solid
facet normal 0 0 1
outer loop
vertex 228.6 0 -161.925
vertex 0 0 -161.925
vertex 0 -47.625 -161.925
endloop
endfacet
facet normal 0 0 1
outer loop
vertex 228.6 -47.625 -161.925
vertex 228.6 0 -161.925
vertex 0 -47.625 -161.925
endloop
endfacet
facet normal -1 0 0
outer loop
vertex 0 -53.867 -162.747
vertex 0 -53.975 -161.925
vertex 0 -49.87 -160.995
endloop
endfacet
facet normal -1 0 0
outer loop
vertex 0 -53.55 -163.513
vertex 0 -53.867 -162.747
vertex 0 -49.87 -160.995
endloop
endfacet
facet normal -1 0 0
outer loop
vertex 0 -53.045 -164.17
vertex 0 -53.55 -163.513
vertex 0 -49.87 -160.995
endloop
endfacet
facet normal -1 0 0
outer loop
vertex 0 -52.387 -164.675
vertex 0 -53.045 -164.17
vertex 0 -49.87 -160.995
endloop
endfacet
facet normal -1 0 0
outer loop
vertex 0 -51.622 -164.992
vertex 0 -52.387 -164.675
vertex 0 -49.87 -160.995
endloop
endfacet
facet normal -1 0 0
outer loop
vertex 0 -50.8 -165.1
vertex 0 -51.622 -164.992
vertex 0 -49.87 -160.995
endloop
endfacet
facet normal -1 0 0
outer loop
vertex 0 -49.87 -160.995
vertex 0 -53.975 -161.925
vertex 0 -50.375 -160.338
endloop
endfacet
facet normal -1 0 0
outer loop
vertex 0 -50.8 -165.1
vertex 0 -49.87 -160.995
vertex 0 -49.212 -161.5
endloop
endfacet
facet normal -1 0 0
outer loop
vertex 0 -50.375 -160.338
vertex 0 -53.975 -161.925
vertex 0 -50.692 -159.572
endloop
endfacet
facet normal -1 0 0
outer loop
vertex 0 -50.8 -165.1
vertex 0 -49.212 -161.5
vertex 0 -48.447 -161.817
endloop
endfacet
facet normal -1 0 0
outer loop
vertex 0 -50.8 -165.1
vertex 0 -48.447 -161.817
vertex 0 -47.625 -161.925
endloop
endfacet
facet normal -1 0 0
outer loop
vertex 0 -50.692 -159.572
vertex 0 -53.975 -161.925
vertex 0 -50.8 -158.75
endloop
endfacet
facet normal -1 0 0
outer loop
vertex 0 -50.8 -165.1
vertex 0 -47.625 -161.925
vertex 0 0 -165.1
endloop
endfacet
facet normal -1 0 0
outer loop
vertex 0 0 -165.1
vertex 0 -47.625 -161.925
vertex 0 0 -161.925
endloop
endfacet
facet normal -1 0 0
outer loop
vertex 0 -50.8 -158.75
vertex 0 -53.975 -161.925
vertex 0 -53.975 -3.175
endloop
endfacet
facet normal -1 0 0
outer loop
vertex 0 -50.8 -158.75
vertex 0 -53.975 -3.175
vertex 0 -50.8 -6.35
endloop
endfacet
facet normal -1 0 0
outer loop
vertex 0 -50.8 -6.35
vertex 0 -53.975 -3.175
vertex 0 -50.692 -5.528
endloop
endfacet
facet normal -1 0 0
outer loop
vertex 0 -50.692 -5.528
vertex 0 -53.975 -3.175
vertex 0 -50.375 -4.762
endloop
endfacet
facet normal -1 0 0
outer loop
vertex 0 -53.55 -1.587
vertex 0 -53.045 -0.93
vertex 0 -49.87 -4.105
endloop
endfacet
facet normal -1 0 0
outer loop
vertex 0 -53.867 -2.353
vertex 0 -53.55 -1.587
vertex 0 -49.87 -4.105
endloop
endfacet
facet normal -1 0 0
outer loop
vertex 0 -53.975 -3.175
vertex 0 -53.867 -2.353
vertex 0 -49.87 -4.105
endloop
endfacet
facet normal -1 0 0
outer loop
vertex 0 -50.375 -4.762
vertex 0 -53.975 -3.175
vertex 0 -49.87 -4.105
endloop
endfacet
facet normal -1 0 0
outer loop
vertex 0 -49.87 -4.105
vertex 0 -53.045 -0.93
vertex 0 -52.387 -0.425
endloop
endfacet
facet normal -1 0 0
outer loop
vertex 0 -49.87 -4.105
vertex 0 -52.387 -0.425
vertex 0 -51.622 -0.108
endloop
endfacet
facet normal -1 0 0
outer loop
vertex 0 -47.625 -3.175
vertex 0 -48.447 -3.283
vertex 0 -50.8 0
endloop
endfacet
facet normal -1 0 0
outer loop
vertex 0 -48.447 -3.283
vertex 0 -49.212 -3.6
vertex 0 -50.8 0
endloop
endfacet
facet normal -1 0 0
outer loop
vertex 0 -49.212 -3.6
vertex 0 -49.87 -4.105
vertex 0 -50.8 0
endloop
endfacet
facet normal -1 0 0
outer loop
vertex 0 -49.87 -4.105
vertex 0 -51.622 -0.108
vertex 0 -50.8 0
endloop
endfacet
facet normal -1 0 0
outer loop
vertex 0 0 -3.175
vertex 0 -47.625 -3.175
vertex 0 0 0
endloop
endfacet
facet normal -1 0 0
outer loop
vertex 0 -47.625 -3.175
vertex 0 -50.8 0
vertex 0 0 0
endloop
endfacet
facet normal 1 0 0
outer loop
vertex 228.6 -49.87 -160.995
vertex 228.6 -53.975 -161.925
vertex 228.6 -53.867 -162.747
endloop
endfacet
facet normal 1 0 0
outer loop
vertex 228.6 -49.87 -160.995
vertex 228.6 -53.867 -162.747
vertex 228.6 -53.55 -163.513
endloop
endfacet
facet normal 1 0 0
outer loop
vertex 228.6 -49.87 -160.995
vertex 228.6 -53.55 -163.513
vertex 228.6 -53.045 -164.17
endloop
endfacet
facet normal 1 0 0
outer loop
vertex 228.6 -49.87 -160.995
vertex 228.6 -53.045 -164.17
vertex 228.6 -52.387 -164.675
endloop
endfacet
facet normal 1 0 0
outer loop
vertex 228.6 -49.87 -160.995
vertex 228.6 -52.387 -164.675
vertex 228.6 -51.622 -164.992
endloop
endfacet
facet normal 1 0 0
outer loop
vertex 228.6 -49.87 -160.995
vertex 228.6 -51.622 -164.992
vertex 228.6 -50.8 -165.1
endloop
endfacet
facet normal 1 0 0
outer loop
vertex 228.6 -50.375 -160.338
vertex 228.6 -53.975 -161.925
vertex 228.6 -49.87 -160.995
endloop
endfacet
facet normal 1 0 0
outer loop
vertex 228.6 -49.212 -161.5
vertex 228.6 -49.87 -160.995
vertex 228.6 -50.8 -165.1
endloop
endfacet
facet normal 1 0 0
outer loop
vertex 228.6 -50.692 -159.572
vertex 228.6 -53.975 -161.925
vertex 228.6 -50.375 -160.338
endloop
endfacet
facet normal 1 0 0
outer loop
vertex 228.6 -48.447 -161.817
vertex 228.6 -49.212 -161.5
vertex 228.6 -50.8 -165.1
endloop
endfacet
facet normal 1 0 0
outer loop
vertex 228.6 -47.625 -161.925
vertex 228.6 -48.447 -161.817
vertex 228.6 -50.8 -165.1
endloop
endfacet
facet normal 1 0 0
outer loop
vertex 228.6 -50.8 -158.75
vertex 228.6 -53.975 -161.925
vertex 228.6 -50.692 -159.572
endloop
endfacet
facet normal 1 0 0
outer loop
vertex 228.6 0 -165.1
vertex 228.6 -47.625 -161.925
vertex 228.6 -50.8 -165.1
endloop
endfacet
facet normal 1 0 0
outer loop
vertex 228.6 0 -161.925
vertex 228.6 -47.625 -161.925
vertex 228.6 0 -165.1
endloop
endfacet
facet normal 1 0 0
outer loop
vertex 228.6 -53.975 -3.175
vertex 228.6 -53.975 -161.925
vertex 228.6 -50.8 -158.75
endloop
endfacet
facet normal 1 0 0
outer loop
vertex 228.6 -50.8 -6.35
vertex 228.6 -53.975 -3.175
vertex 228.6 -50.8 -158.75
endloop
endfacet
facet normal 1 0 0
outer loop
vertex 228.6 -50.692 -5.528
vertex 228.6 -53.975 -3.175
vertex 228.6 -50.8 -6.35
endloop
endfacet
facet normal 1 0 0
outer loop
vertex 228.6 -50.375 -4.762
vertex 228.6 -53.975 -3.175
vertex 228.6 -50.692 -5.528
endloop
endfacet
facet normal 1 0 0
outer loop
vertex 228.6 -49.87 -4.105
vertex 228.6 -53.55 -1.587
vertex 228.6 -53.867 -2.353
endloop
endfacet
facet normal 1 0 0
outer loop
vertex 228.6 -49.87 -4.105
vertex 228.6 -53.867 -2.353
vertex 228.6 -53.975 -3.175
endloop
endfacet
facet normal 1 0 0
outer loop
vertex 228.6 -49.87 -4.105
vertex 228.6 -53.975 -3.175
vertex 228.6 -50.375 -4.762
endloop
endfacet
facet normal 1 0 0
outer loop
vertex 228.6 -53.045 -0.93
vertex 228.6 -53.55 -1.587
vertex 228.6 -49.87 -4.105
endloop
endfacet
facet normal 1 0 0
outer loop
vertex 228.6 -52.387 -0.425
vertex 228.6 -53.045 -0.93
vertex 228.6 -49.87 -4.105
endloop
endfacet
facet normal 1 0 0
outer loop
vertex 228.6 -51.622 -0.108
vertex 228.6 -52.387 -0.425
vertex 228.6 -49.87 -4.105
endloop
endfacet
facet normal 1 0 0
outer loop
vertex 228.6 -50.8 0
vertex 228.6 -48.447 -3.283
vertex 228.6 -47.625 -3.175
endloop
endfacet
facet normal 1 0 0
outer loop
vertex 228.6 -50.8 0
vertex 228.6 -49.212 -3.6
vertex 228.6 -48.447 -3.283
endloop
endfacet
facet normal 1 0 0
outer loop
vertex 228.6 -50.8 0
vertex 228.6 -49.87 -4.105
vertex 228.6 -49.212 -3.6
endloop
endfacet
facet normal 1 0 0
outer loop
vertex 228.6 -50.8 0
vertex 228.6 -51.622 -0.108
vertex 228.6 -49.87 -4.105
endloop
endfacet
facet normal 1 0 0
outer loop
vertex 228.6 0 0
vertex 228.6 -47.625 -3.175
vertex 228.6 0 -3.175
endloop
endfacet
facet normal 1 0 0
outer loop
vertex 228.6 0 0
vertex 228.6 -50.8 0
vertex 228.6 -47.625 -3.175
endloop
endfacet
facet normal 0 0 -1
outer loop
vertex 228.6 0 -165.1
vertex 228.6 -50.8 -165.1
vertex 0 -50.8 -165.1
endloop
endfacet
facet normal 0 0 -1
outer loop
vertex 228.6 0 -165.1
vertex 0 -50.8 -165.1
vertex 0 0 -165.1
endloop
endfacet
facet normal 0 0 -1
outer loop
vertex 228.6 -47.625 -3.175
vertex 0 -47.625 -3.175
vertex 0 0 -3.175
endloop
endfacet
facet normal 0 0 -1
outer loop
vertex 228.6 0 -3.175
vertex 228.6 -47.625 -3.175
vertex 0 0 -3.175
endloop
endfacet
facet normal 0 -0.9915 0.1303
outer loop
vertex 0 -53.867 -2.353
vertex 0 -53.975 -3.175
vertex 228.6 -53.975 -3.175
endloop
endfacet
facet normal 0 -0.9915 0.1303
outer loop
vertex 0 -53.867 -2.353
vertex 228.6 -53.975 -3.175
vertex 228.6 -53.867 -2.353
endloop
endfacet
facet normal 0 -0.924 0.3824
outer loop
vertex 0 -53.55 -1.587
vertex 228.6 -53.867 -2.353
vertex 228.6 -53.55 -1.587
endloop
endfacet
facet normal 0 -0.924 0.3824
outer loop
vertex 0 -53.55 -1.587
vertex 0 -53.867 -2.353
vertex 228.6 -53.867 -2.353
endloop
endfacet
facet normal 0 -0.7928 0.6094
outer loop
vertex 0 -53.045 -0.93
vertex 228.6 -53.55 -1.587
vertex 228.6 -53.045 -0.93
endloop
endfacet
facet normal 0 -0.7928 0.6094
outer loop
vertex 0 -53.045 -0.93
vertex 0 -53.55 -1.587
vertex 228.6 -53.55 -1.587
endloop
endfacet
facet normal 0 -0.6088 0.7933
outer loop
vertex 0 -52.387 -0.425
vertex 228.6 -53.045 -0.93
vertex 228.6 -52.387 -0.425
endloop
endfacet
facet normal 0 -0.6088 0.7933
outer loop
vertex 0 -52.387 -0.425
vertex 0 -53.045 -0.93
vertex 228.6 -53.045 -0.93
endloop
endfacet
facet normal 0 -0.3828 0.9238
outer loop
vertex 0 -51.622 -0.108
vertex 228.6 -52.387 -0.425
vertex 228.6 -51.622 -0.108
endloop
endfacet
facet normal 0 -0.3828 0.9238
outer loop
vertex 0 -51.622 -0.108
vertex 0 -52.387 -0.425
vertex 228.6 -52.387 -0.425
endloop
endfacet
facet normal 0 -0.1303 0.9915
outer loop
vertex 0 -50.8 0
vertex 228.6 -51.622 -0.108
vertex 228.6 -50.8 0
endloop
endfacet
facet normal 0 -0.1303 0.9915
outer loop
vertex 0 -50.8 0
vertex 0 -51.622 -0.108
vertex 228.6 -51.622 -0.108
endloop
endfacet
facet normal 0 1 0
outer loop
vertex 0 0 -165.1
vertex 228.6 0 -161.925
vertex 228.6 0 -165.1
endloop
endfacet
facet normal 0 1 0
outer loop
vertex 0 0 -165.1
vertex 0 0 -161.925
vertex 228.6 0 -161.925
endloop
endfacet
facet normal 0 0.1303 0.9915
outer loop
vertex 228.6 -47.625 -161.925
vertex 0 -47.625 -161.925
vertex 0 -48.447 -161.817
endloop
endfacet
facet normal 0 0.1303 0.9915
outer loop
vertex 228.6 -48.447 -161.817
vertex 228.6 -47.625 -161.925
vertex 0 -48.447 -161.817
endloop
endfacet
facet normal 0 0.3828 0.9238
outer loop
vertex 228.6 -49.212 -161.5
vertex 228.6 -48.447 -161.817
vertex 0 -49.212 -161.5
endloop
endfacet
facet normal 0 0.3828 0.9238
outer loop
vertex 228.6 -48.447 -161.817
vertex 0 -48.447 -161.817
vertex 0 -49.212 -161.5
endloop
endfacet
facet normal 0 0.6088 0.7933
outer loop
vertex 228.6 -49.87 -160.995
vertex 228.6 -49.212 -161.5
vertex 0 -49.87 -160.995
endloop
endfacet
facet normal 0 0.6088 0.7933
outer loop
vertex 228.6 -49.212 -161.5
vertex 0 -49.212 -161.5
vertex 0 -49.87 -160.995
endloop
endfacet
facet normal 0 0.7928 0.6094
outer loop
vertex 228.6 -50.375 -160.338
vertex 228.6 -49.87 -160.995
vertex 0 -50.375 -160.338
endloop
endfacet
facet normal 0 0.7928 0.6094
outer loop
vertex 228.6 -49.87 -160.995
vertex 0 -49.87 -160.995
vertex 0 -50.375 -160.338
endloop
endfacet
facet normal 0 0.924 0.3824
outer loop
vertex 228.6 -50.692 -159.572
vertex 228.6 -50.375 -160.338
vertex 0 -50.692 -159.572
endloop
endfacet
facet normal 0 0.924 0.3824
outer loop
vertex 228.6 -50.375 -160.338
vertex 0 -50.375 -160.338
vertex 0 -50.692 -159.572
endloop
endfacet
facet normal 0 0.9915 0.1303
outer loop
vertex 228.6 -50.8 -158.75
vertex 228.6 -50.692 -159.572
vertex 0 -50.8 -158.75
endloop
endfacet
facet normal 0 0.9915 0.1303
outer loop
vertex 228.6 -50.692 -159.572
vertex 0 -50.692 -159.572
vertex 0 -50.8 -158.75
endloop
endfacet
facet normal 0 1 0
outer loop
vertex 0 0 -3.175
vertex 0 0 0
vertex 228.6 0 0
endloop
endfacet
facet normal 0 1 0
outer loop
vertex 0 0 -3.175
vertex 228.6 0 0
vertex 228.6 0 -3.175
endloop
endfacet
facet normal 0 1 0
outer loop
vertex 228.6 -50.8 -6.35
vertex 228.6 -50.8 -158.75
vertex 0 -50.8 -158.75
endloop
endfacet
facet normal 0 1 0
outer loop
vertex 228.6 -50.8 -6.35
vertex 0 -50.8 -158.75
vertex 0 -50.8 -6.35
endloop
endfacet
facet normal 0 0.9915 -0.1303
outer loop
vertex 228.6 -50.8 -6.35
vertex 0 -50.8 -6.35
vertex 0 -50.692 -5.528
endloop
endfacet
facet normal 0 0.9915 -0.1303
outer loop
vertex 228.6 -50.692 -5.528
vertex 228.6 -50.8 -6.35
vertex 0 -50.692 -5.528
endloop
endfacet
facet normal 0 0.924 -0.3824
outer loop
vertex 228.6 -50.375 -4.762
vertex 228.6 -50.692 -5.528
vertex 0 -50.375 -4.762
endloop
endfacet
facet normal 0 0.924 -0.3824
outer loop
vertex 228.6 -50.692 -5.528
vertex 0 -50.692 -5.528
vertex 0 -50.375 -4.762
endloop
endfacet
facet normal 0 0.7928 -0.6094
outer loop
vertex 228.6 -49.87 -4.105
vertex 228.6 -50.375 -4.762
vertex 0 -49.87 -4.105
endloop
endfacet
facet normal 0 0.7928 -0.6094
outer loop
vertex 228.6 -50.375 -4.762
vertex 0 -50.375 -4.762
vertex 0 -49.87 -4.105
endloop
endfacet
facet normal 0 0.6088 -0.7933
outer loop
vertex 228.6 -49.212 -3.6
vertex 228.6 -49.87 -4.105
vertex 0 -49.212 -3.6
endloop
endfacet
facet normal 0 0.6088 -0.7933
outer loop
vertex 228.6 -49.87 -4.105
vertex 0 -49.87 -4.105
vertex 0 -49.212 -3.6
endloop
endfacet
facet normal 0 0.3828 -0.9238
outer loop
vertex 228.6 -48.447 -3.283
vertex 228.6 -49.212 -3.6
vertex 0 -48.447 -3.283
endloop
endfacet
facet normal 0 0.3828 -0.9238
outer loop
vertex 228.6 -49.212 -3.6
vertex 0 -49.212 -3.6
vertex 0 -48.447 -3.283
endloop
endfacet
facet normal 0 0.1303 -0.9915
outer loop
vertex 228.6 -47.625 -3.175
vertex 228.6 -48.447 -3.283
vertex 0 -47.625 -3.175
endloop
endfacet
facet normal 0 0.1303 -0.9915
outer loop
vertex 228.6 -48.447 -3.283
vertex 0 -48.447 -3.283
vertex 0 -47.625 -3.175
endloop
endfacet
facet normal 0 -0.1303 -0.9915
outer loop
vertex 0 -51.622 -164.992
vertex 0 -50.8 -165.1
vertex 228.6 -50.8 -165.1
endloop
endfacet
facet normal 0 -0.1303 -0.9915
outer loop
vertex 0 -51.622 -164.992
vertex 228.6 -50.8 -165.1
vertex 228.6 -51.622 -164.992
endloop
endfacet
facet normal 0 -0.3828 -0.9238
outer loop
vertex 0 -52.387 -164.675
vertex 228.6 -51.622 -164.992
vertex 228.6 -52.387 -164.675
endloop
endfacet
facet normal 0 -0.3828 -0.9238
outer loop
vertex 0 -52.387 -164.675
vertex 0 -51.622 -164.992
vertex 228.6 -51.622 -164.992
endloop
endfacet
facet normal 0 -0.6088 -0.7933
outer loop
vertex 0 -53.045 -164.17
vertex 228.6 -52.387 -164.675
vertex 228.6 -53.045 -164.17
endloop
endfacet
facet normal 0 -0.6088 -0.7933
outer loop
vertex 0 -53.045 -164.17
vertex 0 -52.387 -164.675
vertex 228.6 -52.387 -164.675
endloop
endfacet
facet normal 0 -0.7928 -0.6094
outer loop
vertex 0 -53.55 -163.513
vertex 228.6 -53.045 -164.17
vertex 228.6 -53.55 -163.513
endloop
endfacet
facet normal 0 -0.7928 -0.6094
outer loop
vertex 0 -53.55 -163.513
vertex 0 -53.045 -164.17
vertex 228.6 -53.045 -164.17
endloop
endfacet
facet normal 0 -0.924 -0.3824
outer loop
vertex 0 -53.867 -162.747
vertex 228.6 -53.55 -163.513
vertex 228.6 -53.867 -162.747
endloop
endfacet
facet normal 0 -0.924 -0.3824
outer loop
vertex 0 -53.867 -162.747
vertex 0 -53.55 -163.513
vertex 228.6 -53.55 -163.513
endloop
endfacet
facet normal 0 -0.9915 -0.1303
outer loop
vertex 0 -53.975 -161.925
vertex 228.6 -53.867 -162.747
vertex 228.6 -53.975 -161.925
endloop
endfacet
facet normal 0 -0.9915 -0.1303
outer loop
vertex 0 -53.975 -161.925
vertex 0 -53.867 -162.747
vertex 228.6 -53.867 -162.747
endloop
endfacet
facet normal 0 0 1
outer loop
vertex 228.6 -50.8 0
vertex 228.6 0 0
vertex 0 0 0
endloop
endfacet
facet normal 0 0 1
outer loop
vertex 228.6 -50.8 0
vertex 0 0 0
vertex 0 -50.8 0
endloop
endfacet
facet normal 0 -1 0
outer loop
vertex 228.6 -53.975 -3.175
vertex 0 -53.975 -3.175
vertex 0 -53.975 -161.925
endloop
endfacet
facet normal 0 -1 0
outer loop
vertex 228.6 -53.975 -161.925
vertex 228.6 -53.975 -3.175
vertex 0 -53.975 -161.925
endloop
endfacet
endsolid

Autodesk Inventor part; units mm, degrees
ref_plane "YZ Plane" through (0, 0, 0) normal (1, 0, 0) x (0, 1, 0)
ref_plane "XZ Plane" through (0, 0, 0) normal (0, 1, 0) x (-1, 0, 0)
ref_plane "XY Plane" through (0, 0, 0) normal (0, 0, 1) x (1, 0, 0)
sketch "Sketch1" plane through (0, 0, 0) normal (1, 0, 0) x (0, 1, 0)
  line L0 (0, 0) -> (-50.8, 0)
  line L1 (-53.975, -3.175) -> (-53.975, -161.925)
  line L2 (-50.8, -165.1) -> (0, -165.1)
  line L3 (0, -161.925) -> (-47.625, -161.925)
  line L4 (-50.8, -158.75) -> (-50.8, -6.35)
  line L5 (-47.625, -3.175) -> (0, -3.175)
  line L6 (0, 0) -> (0, -3.175)
  line L7 (0, -161.925) -> (0, -165.1)
  arc A0 (-50.8, 0) -> (-53.975, -3.175) centre (-50.8, -3.175) ccw
  arc A1 (-53.975, -161.925) -> (-50.8, -165.1) centre (-50.8, -161.925) ccw
  arc A2 (-47.625, -3.175) -> (-50.8, -6.35) centre (-47.625, -6.35) ccw
  arc A3 (-50.8, -158.75) -> (-47.625, -161.925) centre (-47.625, -158.75) ccw
  point P0 (-50.8, -161.925)
  point P1 (-50.8, -3.175)
  dimension "d3" = 3.175
  dimension "d4" = 50.8
  dimension "d5" = 158.75
  dimension "d6" = 3.175
extrude "Extrusion1" add sketch "Sketch1" along normal blind 228.6
properties part number "improved lift c chanel"
